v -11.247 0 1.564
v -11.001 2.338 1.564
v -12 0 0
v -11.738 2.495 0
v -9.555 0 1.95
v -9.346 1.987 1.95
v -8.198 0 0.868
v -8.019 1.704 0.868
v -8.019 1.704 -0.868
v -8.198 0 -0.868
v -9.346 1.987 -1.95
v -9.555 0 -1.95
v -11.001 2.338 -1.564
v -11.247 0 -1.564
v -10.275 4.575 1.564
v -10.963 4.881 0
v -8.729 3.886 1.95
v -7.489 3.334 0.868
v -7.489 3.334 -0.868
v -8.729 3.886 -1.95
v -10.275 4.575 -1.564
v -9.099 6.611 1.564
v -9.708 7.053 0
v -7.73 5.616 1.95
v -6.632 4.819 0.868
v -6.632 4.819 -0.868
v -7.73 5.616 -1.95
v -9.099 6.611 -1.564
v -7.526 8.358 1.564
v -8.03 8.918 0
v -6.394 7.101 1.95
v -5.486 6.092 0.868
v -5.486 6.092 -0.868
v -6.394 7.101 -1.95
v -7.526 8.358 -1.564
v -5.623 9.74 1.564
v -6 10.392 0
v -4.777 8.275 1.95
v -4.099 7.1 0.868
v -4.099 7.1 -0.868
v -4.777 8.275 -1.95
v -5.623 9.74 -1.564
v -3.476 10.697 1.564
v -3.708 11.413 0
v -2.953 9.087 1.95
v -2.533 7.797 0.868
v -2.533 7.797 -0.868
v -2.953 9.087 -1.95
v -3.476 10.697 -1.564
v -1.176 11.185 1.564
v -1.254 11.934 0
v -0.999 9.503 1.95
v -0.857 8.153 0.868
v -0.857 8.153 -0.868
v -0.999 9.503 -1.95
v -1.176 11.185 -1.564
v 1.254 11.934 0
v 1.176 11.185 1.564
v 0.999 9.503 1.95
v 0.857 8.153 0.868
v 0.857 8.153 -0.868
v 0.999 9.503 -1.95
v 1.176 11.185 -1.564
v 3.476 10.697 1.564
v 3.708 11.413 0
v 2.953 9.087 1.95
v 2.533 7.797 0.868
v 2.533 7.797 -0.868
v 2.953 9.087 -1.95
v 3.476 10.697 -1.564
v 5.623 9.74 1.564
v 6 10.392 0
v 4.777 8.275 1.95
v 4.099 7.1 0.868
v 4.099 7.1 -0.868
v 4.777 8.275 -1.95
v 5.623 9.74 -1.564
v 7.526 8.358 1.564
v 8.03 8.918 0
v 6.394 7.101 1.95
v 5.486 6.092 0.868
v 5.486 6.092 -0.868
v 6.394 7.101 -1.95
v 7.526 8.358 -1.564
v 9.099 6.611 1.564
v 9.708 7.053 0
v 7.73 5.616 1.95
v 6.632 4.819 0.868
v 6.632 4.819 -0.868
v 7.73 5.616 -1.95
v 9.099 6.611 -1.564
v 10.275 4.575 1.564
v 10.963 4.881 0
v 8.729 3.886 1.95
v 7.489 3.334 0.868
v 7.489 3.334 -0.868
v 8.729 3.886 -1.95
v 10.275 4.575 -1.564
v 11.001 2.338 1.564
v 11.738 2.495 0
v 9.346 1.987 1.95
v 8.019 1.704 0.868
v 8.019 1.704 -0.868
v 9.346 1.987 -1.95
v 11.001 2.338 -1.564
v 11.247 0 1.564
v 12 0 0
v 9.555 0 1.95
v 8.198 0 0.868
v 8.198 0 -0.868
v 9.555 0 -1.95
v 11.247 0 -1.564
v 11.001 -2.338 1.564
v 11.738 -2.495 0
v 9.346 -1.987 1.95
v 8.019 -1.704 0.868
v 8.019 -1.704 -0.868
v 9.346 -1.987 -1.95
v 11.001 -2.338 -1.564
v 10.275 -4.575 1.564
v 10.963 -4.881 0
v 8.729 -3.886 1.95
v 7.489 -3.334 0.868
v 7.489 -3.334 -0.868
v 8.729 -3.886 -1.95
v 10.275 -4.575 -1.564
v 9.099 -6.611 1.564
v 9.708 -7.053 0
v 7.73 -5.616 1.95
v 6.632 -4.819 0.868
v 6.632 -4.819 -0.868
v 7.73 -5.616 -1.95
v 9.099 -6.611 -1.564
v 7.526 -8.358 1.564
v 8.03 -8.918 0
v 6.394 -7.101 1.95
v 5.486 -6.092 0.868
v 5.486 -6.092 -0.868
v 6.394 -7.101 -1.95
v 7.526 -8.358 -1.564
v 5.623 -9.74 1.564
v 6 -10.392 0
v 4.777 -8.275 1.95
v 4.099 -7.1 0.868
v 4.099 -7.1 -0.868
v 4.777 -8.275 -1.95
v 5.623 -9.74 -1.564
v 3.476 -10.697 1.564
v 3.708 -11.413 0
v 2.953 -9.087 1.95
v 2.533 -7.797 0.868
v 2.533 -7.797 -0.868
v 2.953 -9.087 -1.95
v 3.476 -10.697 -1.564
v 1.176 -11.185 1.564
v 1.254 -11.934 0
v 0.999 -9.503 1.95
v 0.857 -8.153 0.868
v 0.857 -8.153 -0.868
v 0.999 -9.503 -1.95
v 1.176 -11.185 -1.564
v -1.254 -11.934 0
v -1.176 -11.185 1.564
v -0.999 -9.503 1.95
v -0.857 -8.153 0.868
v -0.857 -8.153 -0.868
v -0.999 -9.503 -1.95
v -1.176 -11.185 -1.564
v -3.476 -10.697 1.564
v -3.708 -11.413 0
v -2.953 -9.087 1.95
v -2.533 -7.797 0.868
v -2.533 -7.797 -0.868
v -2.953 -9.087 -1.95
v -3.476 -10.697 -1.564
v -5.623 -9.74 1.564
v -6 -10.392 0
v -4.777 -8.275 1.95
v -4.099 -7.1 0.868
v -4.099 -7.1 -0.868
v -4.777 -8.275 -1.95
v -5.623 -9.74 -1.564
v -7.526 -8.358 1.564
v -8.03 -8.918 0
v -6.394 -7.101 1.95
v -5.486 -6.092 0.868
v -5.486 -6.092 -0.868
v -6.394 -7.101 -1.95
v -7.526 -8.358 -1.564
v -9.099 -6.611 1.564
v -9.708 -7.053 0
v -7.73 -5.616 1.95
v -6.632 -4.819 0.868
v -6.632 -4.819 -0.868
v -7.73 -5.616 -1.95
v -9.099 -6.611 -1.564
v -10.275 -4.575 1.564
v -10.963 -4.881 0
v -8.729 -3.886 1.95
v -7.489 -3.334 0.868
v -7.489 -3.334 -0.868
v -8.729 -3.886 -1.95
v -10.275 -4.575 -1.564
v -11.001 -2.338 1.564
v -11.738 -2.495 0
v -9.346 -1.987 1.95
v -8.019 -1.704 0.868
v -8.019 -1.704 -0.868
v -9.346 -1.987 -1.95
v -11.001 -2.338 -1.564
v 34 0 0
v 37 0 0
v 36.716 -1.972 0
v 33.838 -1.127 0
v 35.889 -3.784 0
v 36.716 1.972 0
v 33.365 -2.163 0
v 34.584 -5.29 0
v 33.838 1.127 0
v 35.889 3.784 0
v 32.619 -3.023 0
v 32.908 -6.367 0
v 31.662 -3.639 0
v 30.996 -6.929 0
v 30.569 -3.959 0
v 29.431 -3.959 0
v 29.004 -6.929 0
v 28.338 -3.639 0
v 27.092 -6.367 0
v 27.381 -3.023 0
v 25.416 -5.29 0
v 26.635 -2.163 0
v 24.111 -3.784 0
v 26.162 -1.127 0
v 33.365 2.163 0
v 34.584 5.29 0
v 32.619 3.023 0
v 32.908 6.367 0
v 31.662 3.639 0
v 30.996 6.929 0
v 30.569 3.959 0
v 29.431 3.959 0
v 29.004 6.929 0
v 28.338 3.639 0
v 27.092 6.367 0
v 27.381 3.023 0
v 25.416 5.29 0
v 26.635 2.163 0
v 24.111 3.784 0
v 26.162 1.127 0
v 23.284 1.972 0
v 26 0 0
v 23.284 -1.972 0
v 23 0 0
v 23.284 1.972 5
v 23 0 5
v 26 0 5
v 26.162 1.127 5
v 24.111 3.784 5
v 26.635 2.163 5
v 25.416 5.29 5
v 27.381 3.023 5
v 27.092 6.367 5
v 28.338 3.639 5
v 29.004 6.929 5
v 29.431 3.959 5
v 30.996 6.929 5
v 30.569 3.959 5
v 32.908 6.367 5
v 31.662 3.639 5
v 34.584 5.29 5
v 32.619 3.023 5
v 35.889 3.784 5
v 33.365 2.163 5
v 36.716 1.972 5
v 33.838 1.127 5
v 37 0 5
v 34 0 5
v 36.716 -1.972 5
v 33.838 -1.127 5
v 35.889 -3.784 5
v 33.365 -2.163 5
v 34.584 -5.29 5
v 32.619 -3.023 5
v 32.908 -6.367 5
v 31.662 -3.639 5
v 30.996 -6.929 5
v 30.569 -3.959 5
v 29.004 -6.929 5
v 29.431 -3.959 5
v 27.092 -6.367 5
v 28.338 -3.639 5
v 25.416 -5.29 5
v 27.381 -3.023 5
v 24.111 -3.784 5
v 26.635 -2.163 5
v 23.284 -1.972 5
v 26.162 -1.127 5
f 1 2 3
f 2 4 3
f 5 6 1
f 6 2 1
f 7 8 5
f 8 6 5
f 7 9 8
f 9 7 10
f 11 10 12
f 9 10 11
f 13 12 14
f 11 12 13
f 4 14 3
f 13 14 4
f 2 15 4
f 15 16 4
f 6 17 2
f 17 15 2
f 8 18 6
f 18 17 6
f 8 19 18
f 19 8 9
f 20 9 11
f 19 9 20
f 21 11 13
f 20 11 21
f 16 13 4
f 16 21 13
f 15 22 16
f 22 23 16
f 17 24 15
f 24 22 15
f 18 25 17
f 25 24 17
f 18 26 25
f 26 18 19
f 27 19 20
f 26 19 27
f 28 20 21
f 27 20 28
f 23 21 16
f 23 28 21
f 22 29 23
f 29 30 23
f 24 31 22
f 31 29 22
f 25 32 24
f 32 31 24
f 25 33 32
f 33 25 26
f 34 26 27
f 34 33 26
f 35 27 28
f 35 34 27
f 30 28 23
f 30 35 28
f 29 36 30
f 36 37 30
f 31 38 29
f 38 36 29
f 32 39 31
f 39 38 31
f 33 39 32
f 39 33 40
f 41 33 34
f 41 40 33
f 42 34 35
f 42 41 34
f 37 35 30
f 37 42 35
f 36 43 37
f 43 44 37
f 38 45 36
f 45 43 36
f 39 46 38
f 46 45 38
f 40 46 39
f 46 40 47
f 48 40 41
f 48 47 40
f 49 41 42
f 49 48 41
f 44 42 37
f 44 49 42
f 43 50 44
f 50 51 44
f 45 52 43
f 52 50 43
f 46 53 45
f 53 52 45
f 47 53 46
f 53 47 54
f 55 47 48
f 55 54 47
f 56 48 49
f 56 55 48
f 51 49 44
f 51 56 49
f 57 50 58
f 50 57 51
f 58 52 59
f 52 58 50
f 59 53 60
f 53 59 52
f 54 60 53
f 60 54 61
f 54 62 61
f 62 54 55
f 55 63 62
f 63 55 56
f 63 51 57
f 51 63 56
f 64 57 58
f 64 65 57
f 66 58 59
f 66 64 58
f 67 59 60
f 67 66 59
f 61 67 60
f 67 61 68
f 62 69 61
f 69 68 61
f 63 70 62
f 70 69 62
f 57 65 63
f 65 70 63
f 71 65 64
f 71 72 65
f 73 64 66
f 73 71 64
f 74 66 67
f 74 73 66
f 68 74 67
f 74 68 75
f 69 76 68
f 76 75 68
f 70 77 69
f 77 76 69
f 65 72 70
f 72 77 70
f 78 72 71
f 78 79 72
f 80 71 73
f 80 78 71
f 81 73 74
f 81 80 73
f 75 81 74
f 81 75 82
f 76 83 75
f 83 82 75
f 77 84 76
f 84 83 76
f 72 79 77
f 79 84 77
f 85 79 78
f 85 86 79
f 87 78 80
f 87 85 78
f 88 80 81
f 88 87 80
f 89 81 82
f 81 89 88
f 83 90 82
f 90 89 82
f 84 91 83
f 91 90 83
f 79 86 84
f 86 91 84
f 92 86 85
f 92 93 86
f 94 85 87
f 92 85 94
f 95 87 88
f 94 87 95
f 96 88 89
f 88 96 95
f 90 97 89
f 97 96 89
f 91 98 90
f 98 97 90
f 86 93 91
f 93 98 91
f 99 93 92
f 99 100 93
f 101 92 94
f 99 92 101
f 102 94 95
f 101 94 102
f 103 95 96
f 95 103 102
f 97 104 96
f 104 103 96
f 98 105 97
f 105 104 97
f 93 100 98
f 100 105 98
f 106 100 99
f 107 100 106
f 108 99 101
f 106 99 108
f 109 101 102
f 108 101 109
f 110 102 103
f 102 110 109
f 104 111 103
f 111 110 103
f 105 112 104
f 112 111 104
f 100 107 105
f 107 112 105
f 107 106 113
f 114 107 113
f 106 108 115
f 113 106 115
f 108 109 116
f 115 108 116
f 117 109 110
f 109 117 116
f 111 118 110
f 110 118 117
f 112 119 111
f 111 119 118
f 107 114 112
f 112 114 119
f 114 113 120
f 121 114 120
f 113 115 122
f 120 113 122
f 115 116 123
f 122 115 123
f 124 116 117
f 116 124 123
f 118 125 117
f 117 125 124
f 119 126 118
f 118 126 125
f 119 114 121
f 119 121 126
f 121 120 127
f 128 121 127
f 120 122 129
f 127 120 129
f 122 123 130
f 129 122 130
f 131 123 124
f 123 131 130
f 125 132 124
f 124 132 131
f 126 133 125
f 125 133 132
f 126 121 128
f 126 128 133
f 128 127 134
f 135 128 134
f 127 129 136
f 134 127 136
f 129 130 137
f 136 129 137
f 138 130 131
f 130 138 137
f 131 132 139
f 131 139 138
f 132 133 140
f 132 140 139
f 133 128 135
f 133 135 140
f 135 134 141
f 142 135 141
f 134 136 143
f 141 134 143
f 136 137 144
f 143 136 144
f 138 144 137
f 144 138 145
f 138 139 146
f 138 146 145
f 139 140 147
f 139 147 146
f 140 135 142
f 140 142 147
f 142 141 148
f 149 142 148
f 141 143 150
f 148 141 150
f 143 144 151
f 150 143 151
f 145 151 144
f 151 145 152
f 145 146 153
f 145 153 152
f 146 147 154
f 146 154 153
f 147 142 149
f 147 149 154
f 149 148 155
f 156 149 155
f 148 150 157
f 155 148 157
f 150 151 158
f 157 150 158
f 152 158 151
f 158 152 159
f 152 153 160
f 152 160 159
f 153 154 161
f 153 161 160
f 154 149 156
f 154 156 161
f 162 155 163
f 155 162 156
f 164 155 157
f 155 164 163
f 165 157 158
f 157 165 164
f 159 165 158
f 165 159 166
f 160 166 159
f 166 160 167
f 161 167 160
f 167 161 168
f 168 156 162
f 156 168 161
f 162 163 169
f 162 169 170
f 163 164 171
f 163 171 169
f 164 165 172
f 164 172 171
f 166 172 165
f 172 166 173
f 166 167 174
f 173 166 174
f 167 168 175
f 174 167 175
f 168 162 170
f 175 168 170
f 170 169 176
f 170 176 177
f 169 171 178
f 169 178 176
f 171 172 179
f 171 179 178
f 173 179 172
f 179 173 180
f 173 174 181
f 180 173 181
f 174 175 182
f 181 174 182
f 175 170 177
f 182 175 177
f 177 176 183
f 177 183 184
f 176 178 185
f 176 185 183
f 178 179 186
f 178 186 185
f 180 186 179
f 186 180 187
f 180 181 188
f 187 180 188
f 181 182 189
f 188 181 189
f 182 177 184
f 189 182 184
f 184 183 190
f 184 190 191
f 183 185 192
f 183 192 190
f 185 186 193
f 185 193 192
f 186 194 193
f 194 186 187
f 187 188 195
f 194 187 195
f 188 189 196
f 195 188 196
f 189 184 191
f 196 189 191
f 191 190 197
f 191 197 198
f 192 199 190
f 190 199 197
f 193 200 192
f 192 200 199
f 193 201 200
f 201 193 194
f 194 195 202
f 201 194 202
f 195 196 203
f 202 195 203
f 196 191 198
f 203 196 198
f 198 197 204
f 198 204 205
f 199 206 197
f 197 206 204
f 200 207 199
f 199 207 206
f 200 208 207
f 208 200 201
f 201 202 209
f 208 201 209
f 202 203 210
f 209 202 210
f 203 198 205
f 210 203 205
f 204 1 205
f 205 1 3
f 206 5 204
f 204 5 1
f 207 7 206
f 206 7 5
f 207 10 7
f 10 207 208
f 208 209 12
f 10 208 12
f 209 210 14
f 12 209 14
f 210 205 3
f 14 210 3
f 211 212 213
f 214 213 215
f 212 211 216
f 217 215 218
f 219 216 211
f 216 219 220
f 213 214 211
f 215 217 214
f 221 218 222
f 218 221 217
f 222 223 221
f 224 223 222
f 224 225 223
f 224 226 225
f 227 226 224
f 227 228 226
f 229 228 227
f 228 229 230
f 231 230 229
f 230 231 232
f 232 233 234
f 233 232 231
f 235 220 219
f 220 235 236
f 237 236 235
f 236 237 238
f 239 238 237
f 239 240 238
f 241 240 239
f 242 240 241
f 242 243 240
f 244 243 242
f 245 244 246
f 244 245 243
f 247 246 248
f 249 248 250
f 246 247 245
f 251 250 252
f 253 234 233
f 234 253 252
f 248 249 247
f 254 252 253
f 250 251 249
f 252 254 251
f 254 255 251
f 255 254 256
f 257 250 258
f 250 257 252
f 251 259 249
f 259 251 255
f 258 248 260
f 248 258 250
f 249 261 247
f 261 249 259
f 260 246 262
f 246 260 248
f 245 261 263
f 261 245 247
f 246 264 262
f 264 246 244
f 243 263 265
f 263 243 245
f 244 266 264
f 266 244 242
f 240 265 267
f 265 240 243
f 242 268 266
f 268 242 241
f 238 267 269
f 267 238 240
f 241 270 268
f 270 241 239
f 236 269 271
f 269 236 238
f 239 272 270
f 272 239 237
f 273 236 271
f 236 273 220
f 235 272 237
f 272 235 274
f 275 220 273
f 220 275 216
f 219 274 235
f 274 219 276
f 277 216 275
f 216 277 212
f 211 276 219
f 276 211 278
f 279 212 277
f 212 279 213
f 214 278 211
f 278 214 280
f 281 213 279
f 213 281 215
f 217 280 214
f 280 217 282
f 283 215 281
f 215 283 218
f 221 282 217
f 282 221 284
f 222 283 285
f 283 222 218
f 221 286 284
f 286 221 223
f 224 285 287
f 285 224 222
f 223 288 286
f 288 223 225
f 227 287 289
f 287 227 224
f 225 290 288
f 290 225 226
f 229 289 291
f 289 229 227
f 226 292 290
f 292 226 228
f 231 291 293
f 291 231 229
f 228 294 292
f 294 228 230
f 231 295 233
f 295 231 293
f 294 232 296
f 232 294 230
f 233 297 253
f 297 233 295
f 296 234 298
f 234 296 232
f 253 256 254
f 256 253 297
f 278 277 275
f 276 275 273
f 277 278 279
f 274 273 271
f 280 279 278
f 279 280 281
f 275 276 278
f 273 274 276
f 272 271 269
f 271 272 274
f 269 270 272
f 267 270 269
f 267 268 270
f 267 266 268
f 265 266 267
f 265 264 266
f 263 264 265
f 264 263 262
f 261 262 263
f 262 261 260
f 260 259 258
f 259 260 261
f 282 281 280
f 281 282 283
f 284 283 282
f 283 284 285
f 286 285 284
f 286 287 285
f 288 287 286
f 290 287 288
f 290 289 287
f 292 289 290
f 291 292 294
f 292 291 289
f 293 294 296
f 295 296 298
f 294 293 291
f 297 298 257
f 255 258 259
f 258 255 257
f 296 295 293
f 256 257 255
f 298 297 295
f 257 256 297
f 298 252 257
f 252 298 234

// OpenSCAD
// Purpose: rotate_extrude of a translated circle (ring) and of a rectangle (disc with hole).
rotate_extrude() translate([10, 0]) circle(r = 2);
translate([30, 0, 0]) rotate_extrude() translate([4, 0]) square([3, 5]);
